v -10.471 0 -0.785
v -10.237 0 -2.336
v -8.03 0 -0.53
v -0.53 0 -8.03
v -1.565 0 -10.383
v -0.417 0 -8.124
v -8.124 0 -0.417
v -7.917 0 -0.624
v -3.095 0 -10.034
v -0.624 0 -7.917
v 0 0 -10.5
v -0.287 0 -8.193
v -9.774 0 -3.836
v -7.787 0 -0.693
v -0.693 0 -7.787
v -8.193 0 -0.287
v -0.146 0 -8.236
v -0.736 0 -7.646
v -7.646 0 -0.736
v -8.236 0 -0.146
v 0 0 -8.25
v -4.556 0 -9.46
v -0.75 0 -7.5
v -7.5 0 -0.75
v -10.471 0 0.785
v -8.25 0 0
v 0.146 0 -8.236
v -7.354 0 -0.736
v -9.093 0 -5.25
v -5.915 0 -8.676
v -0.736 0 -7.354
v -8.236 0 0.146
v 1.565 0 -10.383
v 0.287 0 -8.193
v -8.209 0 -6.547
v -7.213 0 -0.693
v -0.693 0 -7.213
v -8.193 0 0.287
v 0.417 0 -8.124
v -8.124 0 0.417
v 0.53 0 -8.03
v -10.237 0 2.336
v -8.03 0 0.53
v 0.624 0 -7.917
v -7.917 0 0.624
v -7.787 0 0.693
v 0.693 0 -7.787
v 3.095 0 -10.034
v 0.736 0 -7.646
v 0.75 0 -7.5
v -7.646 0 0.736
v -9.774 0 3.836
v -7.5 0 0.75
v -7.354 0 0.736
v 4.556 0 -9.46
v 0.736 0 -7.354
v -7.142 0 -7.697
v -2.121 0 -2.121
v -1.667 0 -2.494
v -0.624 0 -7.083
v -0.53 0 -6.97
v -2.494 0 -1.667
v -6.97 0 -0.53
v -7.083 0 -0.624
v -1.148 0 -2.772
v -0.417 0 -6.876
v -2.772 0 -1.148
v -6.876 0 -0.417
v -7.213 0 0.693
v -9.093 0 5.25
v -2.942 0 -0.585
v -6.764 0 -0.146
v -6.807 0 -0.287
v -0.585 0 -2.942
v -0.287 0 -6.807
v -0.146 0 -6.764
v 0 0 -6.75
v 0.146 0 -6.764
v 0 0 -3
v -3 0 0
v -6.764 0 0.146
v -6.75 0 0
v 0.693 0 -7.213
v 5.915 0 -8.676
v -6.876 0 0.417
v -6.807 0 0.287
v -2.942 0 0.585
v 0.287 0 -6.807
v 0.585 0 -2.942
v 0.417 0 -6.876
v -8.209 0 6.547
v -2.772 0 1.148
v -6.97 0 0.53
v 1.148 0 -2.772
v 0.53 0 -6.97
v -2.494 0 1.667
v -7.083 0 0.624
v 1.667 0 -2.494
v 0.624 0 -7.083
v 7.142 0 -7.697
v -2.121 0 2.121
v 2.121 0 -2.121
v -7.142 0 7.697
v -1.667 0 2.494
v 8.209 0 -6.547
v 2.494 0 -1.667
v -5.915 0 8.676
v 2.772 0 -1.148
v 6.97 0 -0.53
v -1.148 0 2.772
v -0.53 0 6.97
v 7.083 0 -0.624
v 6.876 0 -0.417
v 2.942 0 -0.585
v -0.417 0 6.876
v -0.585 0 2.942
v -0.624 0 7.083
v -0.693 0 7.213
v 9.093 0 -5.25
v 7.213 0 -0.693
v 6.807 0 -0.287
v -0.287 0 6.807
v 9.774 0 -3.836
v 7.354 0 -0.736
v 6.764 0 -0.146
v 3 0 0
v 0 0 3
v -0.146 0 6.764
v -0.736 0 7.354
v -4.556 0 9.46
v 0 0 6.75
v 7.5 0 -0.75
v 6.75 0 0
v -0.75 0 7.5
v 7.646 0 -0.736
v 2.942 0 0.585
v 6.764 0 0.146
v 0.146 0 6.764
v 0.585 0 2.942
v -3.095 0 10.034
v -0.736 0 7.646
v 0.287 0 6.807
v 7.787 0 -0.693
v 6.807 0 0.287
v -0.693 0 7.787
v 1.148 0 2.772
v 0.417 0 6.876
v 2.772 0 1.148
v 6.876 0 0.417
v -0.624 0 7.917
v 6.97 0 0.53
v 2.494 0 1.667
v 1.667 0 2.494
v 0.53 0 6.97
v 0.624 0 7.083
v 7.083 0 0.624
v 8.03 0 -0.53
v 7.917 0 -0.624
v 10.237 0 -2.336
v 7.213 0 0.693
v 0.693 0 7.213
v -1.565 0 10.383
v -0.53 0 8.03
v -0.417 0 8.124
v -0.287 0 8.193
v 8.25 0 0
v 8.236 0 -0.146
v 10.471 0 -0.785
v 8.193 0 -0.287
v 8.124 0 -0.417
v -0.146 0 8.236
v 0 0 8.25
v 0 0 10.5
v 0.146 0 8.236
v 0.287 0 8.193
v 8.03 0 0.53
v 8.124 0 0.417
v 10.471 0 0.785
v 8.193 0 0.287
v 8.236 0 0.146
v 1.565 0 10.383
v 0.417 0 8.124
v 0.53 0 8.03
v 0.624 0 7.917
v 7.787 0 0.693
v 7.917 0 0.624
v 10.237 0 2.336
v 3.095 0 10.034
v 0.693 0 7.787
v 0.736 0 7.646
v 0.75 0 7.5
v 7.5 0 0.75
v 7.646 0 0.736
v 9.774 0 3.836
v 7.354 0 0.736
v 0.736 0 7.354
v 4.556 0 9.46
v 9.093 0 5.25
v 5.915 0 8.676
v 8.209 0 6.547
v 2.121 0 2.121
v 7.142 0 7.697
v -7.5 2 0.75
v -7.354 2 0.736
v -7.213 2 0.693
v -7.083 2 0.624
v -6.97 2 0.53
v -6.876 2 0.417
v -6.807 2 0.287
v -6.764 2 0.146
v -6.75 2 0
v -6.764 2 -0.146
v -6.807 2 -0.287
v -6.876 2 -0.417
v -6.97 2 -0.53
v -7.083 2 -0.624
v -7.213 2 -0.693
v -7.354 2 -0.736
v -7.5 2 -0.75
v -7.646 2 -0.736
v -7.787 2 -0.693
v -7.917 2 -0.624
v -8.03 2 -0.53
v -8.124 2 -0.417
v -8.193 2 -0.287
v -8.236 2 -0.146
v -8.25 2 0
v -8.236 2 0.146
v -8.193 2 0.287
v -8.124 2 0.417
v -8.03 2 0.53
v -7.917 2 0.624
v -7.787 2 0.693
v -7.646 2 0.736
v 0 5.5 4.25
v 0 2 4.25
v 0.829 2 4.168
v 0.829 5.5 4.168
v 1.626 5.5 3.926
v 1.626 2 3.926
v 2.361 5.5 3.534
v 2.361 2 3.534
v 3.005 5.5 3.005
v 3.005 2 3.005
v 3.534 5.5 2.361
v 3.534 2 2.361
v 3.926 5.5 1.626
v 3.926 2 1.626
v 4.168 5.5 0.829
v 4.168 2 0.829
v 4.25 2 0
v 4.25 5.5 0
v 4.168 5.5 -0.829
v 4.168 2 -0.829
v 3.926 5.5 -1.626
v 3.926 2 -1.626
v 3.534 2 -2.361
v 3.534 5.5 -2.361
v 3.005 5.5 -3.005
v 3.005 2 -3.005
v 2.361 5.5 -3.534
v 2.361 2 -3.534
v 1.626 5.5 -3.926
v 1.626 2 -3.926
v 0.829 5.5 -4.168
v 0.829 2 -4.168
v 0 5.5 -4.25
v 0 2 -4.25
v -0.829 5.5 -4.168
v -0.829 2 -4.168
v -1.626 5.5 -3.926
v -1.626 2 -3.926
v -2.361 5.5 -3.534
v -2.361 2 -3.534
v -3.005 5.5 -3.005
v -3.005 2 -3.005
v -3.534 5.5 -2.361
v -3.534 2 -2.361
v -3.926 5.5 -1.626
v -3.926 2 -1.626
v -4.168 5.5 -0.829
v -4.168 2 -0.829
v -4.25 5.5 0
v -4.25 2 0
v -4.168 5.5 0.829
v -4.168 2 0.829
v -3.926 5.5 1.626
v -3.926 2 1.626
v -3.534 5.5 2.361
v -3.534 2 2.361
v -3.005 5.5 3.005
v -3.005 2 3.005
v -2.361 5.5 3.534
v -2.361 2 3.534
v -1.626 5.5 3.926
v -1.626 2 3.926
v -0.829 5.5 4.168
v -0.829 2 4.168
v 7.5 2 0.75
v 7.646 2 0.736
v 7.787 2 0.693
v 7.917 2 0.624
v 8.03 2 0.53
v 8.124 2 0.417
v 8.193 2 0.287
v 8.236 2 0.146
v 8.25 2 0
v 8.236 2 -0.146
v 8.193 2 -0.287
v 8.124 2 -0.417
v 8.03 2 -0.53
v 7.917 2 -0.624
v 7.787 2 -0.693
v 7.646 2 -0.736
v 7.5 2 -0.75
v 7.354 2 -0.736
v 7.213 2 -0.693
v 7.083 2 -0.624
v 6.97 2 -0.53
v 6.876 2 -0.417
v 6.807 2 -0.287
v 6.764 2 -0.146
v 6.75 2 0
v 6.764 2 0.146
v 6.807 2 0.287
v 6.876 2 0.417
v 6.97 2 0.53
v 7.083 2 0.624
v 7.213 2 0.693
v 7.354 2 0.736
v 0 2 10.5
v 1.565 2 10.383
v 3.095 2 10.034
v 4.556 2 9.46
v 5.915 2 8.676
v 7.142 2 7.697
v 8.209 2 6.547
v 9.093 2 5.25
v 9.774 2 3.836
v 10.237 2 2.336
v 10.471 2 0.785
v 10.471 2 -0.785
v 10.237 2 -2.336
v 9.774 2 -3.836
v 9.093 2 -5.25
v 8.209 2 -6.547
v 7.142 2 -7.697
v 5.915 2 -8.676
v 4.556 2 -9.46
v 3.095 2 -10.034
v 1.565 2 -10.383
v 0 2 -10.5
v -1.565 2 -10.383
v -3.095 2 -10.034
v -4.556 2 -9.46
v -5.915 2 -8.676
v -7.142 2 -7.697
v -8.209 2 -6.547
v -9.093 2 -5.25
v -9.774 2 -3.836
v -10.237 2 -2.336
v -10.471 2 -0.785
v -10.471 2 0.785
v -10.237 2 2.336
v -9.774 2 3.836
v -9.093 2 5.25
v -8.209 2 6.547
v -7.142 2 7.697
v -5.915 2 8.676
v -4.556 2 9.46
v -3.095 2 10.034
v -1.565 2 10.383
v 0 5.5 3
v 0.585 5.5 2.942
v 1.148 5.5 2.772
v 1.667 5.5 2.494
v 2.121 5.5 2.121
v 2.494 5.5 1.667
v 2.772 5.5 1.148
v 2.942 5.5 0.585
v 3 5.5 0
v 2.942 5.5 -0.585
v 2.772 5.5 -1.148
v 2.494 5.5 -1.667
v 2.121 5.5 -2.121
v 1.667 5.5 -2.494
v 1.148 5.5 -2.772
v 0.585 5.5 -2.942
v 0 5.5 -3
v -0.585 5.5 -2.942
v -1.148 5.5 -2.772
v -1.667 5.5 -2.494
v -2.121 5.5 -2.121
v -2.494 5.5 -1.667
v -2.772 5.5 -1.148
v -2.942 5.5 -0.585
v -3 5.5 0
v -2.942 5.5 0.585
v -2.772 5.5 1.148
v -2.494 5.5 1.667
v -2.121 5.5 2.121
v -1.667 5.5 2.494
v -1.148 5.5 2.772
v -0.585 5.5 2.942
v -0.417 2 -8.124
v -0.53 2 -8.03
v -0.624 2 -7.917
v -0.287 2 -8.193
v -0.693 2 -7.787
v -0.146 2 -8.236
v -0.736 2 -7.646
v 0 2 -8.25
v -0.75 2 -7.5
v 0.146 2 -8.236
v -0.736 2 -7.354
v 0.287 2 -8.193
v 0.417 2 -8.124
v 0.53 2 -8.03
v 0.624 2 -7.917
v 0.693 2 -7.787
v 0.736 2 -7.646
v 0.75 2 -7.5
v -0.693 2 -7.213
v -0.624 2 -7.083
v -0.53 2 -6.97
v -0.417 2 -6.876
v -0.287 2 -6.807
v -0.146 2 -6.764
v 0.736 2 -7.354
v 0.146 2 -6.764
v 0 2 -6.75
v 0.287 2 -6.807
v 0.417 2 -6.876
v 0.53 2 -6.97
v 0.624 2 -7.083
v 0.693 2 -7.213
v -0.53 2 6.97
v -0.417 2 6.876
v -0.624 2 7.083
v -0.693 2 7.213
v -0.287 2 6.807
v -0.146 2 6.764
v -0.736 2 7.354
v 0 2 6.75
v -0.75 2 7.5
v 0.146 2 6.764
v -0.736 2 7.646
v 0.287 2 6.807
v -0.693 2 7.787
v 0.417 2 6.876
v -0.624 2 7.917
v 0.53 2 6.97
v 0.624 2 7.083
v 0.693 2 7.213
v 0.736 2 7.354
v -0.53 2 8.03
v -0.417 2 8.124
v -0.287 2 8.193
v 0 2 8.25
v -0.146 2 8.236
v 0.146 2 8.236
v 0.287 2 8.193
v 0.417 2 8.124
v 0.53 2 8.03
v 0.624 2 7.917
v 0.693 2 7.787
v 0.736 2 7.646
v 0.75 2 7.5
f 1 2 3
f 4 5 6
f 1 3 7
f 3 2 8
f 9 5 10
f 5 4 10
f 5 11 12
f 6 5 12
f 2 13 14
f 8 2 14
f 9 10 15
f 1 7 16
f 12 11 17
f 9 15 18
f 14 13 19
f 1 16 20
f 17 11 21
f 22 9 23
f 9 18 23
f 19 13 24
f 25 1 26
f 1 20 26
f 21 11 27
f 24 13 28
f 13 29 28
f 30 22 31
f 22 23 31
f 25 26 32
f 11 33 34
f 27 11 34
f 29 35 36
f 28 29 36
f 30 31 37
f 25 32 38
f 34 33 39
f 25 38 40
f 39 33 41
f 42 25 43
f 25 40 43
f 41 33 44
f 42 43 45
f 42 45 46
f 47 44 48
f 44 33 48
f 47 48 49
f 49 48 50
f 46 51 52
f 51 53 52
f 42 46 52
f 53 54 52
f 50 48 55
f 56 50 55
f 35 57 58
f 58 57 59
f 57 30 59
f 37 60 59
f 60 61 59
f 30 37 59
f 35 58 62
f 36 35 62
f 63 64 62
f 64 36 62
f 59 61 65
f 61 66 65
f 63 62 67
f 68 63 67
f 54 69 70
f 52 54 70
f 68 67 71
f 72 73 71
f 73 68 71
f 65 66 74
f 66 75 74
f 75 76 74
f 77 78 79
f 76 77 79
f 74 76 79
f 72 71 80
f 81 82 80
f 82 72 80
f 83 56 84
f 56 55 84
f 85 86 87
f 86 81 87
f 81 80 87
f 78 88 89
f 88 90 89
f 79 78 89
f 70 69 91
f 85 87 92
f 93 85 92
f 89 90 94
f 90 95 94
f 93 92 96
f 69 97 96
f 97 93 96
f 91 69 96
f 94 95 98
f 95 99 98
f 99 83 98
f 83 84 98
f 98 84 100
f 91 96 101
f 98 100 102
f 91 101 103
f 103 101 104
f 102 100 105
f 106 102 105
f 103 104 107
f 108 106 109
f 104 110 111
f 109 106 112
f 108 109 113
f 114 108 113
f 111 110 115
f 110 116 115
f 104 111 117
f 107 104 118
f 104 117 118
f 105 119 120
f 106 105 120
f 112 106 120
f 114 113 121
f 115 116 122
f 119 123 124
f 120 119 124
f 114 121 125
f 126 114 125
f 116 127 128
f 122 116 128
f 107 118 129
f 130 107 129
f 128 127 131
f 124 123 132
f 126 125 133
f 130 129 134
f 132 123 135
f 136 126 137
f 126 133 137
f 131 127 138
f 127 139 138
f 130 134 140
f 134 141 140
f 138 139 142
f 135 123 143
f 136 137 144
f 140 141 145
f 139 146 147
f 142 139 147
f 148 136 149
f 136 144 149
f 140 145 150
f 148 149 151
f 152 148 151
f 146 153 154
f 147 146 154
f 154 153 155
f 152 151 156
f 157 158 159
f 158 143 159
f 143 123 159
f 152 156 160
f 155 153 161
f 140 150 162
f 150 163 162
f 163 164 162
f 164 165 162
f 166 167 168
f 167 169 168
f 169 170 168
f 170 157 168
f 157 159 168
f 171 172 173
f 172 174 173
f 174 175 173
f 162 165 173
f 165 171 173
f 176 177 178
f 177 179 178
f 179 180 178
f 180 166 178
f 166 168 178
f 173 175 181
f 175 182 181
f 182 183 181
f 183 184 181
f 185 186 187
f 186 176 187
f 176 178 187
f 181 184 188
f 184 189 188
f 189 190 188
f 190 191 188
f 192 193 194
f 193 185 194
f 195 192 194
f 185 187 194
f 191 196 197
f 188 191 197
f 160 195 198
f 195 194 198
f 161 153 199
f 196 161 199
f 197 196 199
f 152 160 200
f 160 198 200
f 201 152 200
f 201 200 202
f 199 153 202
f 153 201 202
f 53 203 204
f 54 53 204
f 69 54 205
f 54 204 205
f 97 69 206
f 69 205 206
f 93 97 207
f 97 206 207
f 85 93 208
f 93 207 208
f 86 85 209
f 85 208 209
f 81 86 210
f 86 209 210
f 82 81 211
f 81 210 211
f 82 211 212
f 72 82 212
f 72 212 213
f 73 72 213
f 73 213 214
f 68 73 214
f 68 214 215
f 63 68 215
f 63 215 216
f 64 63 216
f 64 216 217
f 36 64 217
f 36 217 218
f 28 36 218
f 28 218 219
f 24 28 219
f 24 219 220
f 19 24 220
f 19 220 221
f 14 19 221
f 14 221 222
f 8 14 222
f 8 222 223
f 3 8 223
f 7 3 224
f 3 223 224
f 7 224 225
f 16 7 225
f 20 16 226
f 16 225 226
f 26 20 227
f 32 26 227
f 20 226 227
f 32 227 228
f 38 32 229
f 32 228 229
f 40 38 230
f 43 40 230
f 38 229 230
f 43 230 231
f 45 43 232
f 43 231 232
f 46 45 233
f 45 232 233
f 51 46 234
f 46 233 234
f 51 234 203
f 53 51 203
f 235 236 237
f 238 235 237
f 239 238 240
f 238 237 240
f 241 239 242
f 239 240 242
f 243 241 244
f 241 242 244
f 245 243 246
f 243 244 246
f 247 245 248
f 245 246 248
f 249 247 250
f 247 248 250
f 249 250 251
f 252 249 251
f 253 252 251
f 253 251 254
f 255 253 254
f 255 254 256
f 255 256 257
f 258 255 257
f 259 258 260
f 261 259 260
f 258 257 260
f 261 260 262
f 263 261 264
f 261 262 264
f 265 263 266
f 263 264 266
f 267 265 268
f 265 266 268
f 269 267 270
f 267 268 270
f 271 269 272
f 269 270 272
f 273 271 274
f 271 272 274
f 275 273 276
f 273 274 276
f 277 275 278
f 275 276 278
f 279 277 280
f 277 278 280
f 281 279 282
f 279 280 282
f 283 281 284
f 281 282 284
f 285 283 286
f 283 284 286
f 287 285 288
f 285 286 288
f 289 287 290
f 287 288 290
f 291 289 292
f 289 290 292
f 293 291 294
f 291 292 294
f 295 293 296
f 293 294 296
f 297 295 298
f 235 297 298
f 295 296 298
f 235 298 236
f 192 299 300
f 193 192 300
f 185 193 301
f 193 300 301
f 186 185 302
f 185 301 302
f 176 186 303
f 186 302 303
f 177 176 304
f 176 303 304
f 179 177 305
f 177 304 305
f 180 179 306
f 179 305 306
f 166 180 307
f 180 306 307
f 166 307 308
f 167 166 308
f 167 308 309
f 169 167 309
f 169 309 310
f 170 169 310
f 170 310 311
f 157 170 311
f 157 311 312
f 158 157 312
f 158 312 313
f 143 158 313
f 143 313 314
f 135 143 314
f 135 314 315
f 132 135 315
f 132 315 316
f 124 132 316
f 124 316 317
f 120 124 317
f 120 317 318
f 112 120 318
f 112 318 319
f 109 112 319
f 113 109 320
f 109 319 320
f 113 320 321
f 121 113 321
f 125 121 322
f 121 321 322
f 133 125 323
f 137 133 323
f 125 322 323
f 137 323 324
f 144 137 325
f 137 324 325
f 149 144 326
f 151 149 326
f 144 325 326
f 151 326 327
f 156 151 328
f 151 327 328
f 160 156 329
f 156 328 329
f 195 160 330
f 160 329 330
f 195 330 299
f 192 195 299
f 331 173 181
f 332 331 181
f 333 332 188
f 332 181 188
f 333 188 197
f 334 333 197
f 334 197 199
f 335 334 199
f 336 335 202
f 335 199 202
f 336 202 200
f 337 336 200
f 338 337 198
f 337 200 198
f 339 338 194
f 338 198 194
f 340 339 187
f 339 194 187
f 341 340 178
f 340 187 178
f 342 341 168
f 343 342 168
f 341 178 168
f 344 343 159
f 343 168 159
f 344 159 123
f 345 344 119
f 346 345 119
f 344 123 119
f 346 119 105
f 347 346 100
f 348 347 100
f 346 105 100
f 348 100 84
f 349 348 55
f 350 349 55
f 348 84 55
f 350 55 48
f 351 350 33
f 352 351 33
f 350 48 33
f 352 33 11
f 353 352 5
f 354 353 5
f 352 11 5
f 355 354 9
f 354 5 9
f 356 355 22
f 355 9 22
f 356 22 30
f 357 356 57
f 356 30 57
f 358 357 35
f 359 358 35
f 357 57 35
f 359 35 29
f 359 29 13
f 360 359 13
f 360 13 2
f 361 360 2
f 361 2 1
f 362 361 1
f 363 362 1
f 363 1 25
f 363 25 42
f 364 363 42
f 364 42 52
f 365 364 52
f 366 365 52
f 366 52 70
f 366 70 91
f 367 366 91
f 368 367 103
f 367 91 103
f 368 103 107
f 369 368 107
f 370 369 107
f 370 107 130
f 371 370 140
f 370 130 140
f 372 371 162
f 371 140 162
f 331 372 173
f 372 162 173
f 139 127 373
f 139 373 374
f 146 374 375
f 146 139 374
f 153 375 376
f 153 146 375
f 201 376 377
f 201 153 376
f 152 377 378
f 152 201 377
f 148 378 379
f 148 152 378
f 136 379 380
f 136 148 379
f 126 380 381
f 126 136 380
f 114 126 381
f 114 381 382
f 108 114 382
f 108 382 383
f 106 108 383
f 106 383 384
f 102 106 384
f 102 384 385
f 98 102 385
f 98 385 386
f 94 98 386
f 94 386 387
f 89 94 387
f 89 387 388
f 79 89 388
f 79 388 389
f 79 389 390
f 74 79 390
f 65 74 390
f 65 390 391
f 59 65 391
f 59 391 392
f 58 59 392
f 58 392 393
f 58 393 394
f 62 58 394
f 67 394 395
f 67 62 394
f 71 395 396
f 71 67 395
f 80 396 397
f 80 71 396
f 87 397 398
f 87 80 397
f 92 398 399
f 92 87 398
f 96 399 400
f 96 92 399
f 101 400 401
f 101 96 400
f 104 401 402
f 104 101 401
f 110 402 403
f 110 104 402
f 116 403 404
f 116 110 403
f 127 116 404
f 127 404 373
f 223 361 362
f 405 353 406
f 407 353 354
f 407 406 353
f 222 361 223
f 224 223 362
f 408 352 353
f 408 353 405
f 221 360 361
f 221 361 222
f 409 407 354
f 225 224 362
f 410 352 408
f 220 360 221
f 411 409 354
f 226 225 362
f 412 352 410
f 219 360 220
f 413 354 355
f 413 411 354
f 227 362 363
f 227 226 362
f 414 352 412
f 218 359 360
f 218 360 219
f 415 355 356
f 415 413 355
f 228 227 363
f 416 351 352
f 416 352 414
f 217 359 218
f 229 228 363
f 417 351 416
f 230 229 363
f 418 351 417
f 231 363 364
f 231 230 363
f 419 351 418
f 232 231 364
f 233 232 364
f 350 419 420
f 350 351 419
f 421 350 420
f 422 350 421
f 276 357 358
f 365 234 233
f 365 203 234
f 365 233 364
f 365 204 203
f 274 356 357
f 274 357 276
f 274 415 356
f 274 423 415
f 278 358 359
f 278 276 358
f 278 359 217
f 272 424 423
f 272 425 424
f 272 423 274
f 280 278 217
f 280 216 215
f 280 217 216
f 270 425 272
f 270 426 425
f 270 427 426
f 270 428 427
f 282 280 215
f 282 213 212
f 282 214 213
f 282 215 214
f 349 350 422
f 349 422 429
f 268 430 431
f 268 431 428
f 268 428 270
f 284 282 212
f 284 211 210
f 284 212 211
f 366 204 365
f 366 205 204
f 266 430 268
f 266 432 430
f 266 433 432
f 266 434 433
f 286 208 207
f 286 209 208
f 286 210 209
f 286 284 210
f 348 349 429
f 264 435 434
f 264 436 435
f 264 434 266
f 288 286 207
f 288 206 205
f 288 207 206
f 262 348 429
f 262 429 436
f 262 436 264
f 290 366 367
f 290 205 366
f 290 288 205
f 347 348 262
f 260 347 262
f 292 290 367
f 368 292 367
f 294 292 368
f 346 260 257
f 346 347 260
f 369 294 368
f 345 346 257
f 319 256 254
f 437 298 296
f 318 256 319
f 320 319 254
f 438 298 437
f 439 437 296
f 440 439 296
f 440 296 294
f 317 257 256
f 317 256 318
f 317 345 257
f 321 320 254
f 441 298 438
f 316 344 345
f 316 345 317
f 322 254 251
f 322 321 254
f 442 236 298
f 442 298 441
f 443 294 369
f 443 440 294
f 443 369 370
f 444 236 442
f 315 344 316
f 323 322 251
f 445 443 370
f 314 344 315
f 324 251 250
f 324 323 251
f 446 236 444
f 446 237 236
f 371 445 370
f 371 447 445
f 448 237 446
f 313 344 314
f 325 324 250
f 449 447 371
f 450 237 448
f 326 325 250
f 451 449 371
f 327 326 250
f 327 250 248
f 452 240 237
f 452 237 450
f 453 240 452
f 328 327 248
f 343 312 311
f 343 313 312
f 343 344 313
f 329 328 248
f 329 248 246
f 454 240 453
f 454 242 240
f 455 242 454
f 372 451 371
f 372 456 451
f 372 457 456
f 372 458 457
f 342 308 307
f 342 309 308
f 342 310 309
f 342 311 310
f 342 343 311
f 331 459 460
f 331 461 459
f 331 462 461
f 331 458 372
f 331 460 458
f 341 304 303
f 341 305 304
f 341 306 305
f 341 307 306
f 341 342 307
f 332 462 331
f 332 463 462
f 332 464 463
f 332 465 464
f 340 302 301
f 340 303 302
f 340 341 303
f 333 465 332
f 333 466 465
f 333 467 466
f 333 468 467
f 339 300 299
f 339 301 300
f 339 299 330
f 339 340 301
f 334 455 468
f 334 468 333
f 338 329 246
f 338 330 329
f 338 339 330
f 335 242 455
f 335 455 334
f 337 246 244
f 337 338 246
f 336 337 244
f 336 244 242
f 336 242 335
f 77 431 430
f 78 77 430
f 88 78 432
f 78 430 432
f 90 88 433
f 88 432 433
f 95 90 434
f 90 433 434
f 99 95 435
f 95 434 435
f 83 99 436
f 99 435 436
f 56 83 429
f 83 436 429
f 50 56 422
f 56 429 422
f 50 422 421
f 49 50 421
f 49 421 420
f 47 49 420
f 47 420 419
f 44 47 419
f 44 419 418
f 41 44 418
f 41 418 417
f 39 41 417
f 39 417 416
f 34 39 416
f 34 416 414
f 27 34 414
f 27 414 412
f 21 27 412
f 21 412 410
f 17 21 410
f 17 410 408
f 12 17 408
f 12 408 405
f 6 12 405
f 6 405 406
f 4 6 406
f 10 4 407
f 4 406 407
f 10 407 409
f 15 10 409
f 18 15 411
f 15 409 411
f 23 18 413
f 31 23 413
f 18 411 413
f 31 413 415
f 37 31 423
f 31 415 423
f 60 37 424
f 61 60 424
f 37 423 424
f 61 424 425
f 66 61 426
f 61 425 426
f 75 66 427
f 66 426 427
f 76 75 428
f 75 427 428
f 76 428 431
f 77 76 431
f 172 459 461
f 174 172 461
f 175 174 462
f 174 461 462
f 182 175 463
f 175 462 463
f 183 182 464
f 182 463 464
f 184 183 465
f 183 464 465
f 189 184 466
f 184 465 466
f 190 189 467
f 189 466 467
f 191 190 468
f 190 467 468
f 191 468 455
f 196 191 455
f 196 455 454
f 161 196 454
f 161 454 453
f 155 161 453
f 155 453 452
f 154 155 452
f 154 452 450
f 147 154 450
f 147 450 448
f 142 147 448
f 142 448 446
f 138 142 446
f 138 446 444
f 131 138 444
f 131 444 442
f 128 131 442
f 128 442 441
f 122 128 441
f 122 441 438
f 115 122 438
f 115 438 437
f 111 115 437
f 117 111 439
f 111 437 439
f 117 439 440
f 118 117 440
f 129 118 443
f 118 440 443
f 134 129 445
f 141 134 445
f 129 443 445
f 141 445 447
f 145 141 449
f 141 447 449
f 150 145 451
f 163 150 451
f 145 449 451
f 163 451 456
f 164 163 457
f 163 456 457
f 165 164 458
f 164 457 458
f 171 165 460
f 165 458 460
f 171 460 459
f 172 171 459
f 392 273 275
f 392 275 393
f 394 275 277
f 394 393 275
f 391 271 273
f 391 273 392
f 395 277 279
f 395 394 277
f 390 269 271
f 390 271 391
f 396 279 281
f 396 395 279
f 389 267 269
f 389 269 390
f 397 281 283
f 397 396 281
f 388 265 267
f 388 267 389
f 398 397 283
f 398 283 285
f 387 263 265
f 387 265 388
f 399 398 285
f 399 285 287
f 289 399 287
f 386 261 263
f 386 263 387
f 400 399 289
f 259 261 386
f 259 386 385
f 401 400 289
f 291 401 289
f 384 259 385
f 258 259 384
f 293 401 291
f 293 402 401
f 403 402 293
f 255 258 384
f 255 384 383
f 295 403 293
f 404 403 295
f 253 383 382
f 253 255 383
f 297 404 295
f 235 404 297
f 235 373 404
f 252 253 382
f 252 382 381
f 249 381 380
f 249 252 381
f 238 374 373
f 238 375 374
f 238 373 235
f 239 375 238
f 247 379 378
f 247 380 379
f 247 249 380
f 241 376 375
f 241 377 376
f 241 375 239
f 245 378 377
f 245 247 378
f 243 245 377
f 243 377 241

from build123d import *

# Parameters (mm, degrees)
SKIZZE1_R                       = 10.5
AUFSATZ_LINEAR_AUSTRAGEN1_DEPTH = 2
SKIZZE2_R                       = 4.25
SKIZZE2_R_2                     = 3
AUFSATZ_LINEAR_AUSTRAGEN2_DEPTH = 3.5
SKIZZE3_R                       = 0.75
SCHNITT_LINEAR_AUSTRAGEN1_DEPTH = 3.5
SCHNITT_LINEAR_START            = -3.5
SKIZZE4_R                       = 3
SCHNITT_LINEAR_AUSTRAGEN2_DEPTH = 3.5


with BuildPart() as part:
    # Skizze1 → Aufsatz-Linear austragen1 (new body)
    with BuildSketch(Plane(origin=(0, 0, 0), x_dir=(1, 0, 0), z_dir=(0, 1, 0))):
        with Locations(Location((0, 0, 0), (0, 0, 270))):
            Circle(SKIZZE1_R)
    extrude(amount=AUFSATZ_LINEAR_AUSTRAGEN1_DEPTH)

    # Skizze2 → Aufsatz-Linear austragen2 (add)
    with BuildSketch(Plane(origin=(0, 2, 0), x_dir=(1, 0, 0), z_dir=(0, 1, 0))):
        with Locations(Location((0, 0, 0), (0, 0, 270))):
            Circle(SKIZZE2_R)
        with Locations(Location((0, 0, 0), (0, 0, 270))):
            Circle(SKIZZE2_R_2, mode=Mode.SUBTRACT)
    extrude(amount=AUFSATZ_LINEAR_AUSTRAGEN2_DEPTH)

    # Skizze3 → Schnitt-Linear austragen1 (cut)
    with BuildSketch(Plane(origin=(0, 2, 0), x_dir=(1, 0, 0), z_dir=(0, 1, 0))):
        with Locations(Location((0, 7.5, 0), (0, 0, 270))):
            Circle(SKIZZE3_R)
        with Locations(Location((0, -7.5, 0), (0, 0, 270))):
            Circle(SKIZZE3_R)
        with Locations(Location((7.5, 0, 0), (0, 0, 270))):
            Circle(SKIZZE3_R)
        with Locations(Location((-7.5, 0, 0), (0, 0, 270))):
            Circle(SKIZZE3_R)
    extrude(amount=-SCHNITT_LINEAR_AUSTRAGEN1_DEPTH, mode=Mode.SUBTRACT)

    # Skizze4 → Schnitt-Linear austragen2 (cut)
    with BuildSketch(Plane(origin=(0, 2, 0), x_dir=(1, 0, 0), z_dir=(0, 1, 0)).offset(SCHNITT_LINEAR_START)):
        with Locations(Location((0, 0, 0), (0, 0, 270))):
            Circle(SKIZZE4_R)
    extrude(amount=SCHNITT_LINEAR_AUSTRAGEN2_DEPTH, mode=Mode.SUBTRACT)


solid = part.part
